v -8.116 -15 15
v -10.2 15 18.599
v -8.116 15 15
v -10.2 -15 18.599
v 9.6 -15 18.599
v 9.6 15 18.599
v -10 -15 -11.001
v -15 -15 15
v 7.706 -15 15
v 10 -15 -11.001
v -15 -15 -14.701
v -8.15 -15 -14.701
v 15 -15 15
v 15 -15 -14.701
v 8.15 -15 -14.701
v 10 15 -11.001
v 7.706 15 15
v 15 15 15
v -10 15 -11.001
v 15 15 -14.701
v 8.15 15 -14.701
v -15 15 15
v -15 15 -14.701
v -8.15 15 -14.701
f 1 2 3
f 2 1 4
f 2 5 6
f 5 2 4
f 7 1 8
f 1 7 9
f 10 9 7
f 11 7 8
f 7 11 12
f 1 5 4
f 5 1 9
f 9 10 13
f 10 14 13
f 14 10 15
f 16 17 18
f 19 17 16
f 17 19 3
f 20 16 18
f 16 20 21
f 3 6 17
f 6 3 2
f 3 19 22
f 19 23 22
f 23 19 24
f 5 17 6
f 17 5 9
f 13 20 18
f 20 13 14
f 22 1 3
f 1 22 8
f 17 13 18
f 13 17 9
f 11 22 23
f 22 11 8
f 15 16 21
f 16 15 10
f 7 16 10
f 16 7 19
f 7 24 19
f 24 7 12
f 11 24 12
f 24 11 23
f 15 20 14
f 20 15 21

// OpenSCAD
/**
 * dovetail-test.scad
 * A test of locking modular things together.
 *
 * @author Nathan Campos <nathan@innoveworkshop.com>
 */

eps = 0.001;

/**
 * Creates a 2D trapezoid with a shrinking tolerance factor.
 *
 * @param w   Major width of the trapezoid.
 * @param h   Height of the trapezoid.
 * @param a   Side angle of the trapezoid.
 * @param tol Absolute amount to shrink the part as a whole.
 */
module trapezoid(w, h = 4, a = 2, tol = 0.4) {
	function at(val, t) = val + (tol / 2);
	function st(val, t) = val - (tol / 2);
	
	translate([st(-(w / 2)), st(-(h / 2)), 0])
		polygon(points = [[at(a), 0], [0, st(h)], [st(w), st(h)],
			[st(w - a), 0]]);
}

/**
 * Creates a male or female dovetail joint.
 *
 * @param gender Dovetail gender. ("male" or "female")
 * @param w      Width of the mating face.
 * @param d      Depth of the mating face.
 * @param sm     Margin from the side of the mating face to the end of the
 *               dovetail joint.
 * @param th     Dovetail trapezoid height.
 * @param ta     Side angle of the dovetail trapezoid.
 * @param tol    Absolute tolerance of the fit.
 */
module dovetail(gender, w, d, sm = 5, th = 4, ta = 2, tol = 0.4) {
	dt_eps = 0.001;

	if (gender == "male") {
		// Male Dovetail.
		translate([0, d / 2, th / 2])
		rotate([90, 0, 0])
		linear_extrude(d)
			trapezoid(w - (sm * 2), th, ta, tol);
	} else if (gender == "female") {
		union() {
			// Female dovetail.
			translate([0, (d / 2) + (dt_eps / 2), th / 2])
			rotate([90, 0, 0])
			linear_extrude(d + dt_eps)
				trapezoid(w - (sm * 2), th, ta, 0);
			
			// Tolerance of the fit. Removes a bit of height from the
			// mating surface.
			cube([w + dt_eps, d + dt_eps, tol + 0.2 + dt_eps], center = true);
		}
	} else {
		// Unknown gender.
		assert(false, "Unknown dovetail gender");
	}
}

difference() {
	union() {
		color("red")
		translate([0, 0, 15 - eps])
			dovetail("male", 30, 30);

		cube([30, 30, 30], center = true);
	}

	color("red")
	translate([0, 0, -15 - eps])
		dovetail("female", 30, 30);
}
